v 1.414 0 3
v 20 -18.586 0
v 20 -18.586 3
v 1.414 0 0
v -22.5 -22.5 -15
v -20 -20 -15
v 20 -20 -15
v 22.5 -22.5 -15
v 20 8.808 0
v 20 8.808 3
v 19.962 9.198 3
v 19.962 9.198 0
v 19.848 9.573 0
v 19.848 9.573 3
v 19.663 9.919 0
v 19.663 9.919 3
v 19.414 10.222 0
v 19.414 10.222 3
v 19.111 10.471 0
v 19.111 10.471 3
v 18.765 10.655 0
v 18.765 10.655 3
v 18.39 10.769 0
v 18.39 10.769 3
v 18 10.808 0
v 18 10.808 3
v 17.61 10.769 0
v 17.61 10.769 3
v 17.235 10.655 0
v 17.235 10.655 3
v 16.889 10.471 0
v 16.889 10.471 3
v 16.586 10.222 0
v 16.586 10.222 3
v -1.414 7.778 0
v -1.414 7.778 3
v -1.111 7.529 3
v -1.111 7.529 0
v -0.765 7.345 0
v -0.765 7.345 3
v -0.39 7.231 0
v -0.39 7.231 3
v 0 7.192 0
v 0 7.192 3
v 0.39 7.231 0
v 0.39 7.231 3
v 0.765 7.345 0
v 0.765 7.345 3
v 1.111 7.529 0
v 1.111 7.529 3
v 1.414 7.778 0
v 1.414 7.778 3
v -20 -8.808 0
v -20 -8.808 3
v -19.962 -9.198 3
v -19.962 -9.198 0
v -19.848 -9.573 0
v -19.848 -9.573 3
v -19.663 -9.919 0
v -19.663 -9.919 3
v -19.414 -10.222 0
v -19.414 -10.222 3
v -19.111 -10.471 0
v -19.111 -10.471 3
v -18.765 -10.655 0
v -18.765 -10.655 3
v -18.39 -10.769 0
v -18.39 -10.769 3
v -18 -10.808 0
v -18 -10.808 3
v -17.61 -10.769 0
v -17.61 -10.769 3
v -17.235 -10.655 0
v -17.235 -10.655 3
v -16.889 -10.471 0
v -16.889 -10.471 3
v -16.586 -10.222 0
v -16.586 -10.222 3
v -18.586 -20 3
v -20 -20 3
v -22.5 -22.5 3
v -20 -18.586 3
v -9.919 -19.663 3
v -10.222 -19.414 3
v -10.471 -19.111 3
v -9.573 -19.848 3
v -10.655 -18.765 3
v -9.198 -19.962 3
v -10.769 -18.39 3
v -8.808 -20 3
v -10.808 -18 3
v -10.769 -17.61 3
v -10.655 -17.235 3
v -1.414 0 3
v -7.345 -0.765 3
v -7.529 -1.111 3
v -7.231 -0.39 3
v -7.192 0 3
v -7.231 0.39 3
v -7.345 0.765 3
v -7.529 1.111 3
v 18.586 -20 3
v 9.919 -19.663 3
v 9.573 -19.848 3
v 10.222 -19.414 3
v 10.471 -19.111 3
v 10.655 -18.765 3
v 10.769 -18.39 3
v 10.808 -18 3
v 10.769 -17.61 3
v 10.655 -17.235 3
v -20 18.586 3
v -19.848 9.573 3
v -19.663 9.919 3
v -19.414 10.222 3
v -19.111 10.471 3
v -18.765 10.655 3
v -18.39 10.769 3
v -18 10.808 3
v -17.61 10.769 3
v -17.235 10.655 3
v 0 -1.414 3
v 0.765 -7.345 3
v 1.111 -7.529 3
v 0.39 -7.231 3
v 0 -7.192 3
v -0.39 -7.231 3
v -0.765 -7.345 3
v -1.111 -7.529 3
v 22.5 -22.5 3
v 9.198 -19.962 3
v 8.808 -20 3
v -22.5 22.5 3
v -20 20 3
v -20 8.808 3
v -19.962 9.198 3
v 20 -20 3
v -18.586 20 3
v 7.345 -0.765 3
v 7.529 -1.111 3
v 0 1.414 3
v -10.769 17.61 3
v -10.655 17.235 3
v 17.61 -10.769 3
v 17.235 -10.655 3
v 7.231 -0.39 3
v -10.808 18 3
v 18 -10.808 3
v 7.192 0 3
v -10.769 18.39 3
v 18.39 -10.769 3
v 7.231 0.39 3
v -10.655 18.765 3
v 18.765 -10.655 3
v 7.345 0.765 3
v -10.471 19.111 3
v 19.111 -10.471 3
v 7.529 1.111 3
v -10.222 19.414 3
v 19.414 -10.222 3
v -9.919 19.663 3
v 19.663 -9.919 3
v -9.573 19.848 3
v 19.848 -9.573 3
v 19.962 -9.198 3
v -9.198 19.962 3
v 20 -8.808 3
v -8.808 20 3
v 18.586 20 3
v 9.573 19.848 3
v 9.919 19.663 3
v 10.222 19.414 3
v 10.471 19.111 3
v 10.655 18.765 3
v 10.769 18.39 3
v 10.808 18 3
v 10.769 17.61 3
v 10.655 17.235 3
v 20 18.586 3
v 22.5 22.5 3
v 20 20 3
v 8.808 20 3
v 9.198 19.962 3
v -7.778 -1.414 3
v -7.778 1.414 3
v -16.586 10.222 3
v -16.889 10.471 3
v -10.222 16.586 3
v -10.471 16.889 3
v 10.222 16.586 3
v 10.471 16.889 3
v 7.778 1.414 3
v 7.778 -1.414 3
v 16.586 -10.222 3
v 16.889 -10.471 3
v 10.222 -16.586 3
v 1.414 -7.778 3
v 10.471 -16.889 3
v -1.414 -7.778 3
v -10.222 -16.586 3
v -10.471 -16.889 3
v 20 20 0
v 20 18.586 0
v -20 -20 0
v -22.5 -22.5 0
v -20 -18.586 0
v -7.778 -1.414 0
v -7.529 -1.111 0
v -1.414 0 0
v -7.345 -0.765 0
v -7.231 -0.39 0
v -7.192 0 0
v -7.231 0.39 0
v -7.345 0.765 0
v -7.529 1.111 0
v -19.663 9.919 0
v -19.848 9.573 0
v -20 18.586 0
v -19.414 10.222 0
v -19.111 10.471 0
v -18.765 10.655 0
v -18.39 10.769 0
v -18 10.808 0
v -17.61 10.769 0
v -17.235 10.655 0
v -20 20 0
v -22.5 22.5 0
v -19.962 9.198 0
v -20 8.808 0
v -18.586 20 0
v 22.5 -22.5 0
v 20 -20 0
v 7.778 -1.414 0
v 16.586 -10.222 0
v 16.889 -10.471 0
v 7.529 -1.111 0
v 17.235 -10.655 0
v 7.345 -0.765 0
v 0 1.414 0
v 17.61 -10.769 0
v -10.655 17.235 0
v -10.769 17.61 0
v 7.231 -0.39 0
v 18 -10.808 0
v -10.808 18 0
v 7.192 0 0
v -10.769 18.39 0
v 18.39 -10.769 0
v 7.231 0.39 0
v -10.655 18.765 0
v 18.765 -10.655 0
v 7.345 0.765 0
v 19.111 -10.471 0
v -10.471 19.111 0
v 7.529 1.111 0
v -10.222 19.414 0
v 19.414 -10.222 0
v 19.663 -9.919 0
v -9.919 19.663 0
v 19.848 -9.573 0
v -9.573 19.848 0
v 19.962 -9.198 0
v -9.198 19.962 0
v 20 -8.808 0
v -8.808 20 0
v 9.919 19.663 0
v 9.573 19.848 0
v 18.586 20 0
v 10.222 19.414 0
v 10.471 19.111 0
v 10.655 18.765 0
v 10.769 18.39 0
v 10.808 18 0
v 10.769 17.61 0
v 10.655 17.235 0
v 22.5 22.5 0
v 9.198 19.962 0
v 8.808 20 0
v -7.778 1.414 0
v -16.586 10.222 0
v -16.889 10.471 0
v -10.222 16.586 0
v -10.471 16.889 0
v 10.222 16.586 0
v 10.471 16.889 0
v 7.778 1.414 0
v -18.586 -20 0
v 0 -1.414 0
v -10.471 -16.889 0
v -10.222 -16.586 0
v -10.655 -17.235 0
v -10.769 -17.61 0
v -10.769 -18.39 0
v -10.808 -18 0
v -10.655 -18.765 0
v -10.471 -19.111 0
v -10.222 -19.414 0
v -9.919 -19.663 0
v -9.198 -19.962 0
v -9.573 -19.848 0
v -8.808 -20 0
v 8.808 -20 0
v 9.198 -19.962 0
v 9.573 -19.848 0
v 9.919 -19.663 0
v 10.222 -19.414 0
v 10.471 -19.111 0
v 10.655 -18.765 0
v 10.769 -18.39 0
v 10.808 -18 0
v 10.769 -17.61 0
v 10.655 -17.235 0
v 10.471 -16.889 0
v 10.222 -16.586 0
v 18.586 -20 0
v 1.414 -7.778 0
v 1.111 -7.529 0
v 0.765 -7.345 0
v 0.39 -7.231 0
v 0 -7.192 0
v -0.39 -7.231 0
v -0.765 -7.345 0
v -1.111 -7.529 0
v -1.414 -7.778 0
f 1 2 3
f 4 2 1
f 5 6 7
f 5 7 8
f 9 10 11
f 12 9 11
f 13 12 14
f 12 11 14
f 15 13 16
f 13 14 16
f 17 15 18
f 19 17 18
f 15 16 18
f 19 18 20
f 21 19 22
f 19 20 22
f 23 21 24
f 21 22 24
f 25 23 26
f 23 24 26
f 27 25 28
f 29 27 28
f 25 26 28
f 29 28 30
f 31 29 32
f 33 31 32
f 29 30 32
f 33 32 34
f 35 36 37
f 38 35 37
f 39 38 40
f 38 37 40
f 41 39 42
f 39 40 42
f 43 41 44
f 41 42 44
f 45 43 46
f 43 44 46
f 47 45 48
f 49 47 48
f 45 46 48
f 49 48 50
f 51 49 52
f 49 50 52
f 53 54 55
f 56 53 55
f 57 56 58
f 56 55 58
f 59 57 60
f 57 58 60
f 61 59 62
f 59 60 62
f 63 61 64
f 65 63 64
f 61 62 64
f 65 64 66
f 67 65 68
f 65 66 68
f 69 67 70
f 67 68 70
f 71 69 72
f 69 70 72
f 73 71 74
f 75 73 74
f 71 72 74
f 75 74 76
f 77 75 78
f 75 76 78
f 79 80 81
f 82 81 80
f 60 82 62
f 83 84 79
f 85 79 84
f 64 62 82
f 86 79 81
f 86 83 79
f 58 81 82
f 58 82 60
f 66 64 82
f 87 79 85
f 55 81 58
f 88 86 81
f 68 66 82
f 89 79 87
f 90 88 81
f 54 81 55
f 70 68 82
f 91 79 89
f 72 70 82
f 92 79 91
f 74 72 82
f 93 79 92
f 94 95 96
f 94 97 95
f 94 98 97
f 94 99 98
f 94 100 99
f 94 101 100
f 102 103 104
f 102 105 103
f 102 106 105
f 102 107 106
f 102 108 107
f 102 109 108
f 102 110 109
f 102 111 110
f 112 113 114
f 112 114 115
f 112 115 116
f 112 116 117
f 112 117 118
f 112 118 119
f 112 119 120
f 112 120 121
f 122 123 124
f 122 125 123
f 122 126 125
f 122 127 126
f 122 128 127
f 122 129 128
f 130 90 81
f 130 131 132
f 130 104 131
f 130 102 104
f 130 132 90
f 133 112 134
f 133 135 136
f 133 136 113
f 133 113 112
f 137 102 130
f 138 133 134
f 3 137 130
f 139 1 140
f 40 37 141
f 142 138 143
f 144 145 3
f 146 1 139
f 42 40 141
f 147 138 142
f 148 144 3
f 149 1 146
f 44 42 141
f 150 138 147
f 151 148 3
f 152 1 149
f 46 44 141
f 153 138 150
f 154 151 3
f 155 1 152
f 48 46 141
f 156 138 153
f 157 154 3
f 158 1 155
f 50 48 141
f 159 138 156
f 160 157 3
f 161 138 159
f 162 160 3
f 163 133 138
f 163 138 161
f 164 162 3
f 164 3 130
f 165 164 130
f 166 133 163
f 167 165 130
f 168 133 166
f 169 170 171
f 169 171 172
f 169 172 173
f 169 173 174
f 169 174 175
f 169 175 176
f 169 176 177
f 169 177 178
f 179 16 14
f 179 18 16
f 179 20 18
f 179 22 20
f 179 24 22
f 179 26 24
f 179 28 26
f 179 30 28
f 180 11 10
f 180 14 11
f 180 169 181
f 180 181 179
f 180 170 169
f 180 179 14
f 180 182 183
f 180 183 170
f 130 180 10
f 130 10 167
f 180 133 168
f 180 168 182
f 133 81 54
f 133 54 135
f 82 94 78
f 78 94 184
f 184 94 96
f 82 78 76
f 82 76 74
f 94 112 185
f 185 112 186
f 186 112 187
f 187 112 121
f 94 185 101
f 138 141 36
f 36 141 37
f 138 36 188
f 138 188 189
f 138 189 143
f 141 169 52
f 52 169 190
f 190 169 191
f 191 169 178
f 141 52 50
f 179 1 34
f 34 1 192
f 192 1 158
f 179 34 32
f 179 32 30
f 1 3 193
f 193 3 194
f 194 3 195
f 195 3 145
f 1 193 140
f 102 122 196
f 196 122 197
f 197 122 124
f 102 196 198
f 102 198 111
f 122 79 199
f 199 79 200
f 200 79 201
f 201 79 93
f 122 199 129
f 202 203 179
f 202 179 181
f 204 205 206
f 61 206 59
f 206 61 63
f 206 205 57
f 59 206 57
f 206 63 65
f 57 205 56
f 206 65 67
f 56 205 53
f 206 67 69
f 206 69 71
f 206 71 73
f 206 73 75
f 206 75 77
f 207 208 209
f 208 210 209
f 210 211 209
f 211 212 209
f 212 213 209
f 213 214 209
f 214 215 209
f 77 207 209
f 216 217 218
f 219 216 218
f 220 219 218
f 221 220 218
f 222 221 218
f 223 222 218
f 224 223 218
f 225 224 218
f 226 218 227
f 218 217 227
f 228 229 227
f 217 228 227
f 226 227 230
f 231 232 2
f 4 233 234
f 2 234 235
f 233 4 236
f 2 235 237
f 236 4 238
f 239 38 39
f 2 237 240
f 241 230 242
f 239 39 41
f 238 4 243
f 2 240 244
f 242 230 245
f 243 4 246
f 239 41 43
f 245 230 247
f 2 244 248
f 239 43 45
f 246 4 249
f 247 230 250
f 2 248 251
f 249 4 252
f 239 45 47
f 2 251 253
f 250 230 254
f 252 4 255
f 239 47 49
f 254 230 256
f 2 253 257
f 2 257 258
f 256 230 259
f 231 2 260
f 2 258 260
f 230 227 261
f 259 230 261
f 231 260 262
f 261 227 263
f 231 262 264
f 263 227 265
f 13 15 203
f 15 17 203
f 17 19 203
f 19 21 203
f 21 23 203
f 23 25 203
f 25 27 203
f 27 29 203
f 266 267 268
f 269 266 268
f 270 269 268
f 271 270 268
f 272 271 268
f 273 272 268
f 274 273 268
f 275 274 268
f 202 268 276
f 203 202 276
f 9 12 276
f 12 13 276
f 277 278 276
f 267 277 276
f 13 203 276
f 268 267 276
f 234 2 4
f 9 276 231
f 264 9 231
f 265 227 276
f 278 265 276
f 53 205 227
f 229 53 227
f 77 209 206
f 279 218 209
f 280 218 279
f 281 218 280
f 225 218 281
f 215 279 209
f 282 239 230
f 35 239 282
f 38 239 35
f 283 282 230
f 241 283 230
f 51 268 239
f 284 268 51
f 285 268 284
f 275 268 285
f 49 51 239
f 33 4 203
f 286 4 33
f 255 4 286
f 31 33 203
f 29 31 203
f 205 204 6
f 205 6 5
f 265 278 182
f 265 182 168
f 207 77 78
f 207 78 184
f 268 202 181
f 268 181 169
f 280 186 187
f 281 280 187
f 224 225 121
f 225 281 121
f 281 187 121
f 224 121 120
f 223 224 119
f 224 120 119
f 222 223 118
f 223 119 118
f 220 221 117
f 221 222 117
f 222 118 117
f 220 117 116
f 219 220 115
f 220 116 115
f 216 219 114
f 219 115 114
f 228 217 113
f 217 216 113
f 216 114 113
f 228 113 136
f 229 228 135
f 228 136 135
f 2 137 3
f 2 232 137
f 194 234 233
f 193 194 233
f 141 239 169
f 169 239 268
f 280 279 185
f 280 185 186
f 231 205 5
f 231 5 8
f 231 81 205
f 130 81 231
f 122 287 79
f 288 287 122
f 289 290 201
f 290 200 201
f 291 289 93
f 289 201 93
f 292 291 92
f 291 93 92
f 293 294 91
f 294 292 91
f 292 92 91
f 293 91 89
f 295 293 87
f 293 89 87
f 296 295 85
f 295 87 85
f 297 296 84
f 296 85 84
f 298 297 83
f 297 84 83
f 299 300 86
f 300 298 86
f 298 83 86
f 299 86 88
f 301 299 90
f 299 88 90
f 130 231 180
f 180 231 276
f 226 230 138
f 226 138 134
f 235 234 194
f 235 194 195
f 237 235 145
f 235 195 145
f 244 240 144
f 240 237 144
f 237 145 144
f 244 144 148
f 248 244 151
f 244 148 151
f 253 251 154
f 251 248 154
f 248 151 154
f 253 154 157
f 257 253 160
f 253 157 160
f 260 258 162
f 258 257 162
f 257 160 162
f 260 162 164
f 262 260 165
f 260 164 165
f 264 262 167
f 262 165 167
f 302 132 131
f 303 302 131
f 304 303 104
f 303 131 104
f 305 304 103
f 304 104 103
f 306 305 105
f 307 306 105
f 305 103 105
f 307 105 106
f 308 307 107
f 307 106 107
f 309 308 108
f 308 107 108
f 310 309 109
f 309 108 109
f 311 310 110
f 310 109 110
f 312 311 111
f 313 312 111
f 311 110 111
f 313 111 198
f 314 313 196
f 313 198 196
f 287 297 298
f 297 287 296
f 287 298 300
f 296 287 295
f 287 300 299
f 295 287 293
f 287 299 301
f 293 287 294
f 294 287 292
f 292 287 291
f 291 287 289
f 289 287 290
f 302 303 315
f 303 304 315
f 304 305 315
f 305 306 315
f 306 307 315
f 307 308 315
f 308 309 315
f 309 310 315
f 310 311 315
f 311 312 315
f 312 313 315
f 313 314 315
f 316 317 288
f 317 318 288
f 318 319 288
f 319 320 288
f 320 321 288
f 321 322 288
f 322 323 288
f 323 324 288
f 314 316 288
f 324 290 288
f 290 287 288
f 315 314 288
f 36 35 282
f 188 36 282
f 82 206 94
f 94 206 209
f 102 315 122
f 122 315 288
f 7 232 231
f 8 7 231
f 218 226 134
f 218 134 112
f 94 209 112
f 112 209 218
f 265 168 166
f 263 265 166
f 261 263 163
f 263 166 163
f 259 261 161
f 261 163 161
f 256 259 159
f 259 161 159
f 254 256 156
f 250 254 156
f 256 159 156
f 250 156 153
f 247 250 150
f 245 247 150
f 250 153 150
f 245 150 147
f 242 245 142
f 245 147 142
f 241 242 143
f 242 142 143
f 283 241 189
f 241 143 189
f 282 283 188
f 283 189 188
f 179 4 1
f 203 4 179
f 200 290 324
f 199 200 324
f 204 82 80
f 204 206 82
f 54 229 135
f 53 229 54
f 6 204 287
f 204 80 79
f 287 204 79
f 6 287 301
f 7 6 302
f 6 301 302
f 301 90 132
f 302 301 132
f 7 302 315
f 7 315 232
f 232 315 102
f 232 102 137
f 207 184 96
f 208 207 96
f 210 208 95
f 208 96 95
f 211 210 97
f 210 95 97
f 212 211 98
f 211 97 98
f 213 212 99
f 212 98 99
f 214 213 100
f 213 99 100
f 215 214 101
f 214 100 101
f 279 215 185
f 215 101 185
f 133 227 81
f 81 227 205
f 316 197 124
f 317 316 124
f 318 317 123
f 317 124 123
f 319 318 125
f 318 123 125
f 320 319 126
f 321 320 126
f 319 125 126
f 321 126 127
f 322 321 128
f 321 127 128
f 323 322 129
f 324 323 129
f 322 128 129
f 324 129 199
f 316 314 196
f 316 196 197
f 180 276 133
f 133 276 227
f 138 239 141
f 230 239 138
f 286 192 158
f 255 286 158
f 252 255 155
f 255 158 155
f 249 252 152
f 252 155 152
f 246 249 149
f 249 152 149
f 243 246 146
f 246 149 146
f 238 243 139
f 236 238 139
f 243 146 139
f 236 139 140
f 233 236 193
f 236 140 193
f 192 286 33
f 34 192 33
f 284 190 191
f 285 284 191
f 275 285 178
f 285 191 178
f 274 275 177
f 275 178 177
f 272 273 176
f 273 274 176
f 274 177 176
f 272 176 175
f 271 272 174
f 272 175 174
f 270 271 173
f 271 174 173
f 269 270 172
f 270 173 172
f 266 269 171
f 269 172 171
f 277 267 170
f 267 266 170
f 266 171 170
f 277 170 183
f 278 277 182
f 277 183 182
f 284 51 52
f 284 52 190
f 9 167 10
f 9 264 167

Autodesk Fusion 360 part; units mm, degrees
sketch "Sketch1" plane through (0, 0, 0) normal (0, 0, 1) x (1, 0, 0)
  line L0 (22.5, 22.5) -> (-22.5, 22.5)
  line L1 (-20, 20) -> (-20, 10)
  line L2 (22.5, -22.5) -> (22.5, 22.5)
  line L3 (20, -20) -> (10, -20)
  line L4 (-22.5, 22.5) -> (-22.5, -22.5)
  line L5 (-20, -20) -> (10, -20)
  line L6 (-20, 20) -> (-22.5, 22.5)
  line L7 (20, -20) -> (20, 20)
  line L8 (20, -20) -> (22.5, -22.5)
  line L9 (-20, 10) -> (-20, -20)
  line L10 (20, 20) -> (-20, 20)
  line L11 (-22.5, -22.5) -> (22.5, -22.5)
  line L12 (-18.5858, -20) -> (0, -1.4142)
  line L13 (1.4142, 0) -> (20, 18.5858)
  line L14 (18.5858, -20) -> (0, -1.4142)
  line L15 (-1.4142, 0) -> (-20, 18.5858)
  line L16 (-20, -18.5858) -> (-1.4142, 0)
  line L17 (0, 1.4142) -> (18.5858, 20)
  line L18 (20, -18.5858) -> (1.4142, 0)
  line L19 (0, 1.4142) -> (-18.5858, 20)
  line L20 (-18.5858, -20) -> (0, -1.4142)
  line L21 (1.4142, 0) -> (20, 18.5858)
  line L22 (-20, -18.5858) -> (-1.4142, 0)
  line L23 (0, 1.4142) -> (18.5858, 20)
  line L24 (20, -13.636) -> (6.364, 0)
  line L25 (0, 6.364) -> (-13.636, 20)
  line L26 (-20, -13.636) -> (-6.364, 0)
  line L27 (0, 6.364) -> (13.636, 20)
  line L28 (13.636, -20) -> (0, -6.364)
  line L29 (-6.364, 0) -> (-20, 13.636)
  line L30 (-20, -13.636) -> (-6.364, 0)
  line L31 (0, 6.364) -> (13.636, 20)
  line L32 (-13.636, -20) -> (0, -6.364)
  line L33 (6.364, 0) -> (20, 13.636)
  line L34 (6.364, 0) -> (20, 13.636)
  line L35 (-13.636, -20) -> (0, -6.364)
  line L36 (-20, -20) -> (-22.5, -22.5)
  line L37 (20, 20) -> (22.5, 22.5)
  dimension "d3" = 45
  dimension "d4" = 45
extrude "Extrude1" add sketch "Sketch1" along normal blind 3 contours L0 L6 L10 L37 | L2 L7 L8 L37 | L1 L4 L6 L9 L36 | L3 L5 L8 L11 L36 | L7 L13 L18 L21 L24 L33 L34 | L10 L17 L19 L23 L25 L27 L31 | L1 L9 L15 L16 L22 L26 L29 L30 | L3 L5 L12 L14 L20 L28 L32 L35
fillet "Fillet1" radius 2 12 edges at (-20, 13.636, 1.5) (-20, -13.636, 1.5) (-6.364, 0, 1.5) (0, -6.364, 1.5) (20, 13.636, 1.5) (-13.636, -20, 1.5) (6.364, 0, 1.5) (0, 6.364, 1.5) (13.636, -20, 1.5) (20, -13.636, 1.5) (13.636, 20, 1.5) (-13.636, 20, 1.5)
extrude "Extrude2" add sketch "Sketch1" against normal blind 15 contours L3 L5 L8 L11 L36
